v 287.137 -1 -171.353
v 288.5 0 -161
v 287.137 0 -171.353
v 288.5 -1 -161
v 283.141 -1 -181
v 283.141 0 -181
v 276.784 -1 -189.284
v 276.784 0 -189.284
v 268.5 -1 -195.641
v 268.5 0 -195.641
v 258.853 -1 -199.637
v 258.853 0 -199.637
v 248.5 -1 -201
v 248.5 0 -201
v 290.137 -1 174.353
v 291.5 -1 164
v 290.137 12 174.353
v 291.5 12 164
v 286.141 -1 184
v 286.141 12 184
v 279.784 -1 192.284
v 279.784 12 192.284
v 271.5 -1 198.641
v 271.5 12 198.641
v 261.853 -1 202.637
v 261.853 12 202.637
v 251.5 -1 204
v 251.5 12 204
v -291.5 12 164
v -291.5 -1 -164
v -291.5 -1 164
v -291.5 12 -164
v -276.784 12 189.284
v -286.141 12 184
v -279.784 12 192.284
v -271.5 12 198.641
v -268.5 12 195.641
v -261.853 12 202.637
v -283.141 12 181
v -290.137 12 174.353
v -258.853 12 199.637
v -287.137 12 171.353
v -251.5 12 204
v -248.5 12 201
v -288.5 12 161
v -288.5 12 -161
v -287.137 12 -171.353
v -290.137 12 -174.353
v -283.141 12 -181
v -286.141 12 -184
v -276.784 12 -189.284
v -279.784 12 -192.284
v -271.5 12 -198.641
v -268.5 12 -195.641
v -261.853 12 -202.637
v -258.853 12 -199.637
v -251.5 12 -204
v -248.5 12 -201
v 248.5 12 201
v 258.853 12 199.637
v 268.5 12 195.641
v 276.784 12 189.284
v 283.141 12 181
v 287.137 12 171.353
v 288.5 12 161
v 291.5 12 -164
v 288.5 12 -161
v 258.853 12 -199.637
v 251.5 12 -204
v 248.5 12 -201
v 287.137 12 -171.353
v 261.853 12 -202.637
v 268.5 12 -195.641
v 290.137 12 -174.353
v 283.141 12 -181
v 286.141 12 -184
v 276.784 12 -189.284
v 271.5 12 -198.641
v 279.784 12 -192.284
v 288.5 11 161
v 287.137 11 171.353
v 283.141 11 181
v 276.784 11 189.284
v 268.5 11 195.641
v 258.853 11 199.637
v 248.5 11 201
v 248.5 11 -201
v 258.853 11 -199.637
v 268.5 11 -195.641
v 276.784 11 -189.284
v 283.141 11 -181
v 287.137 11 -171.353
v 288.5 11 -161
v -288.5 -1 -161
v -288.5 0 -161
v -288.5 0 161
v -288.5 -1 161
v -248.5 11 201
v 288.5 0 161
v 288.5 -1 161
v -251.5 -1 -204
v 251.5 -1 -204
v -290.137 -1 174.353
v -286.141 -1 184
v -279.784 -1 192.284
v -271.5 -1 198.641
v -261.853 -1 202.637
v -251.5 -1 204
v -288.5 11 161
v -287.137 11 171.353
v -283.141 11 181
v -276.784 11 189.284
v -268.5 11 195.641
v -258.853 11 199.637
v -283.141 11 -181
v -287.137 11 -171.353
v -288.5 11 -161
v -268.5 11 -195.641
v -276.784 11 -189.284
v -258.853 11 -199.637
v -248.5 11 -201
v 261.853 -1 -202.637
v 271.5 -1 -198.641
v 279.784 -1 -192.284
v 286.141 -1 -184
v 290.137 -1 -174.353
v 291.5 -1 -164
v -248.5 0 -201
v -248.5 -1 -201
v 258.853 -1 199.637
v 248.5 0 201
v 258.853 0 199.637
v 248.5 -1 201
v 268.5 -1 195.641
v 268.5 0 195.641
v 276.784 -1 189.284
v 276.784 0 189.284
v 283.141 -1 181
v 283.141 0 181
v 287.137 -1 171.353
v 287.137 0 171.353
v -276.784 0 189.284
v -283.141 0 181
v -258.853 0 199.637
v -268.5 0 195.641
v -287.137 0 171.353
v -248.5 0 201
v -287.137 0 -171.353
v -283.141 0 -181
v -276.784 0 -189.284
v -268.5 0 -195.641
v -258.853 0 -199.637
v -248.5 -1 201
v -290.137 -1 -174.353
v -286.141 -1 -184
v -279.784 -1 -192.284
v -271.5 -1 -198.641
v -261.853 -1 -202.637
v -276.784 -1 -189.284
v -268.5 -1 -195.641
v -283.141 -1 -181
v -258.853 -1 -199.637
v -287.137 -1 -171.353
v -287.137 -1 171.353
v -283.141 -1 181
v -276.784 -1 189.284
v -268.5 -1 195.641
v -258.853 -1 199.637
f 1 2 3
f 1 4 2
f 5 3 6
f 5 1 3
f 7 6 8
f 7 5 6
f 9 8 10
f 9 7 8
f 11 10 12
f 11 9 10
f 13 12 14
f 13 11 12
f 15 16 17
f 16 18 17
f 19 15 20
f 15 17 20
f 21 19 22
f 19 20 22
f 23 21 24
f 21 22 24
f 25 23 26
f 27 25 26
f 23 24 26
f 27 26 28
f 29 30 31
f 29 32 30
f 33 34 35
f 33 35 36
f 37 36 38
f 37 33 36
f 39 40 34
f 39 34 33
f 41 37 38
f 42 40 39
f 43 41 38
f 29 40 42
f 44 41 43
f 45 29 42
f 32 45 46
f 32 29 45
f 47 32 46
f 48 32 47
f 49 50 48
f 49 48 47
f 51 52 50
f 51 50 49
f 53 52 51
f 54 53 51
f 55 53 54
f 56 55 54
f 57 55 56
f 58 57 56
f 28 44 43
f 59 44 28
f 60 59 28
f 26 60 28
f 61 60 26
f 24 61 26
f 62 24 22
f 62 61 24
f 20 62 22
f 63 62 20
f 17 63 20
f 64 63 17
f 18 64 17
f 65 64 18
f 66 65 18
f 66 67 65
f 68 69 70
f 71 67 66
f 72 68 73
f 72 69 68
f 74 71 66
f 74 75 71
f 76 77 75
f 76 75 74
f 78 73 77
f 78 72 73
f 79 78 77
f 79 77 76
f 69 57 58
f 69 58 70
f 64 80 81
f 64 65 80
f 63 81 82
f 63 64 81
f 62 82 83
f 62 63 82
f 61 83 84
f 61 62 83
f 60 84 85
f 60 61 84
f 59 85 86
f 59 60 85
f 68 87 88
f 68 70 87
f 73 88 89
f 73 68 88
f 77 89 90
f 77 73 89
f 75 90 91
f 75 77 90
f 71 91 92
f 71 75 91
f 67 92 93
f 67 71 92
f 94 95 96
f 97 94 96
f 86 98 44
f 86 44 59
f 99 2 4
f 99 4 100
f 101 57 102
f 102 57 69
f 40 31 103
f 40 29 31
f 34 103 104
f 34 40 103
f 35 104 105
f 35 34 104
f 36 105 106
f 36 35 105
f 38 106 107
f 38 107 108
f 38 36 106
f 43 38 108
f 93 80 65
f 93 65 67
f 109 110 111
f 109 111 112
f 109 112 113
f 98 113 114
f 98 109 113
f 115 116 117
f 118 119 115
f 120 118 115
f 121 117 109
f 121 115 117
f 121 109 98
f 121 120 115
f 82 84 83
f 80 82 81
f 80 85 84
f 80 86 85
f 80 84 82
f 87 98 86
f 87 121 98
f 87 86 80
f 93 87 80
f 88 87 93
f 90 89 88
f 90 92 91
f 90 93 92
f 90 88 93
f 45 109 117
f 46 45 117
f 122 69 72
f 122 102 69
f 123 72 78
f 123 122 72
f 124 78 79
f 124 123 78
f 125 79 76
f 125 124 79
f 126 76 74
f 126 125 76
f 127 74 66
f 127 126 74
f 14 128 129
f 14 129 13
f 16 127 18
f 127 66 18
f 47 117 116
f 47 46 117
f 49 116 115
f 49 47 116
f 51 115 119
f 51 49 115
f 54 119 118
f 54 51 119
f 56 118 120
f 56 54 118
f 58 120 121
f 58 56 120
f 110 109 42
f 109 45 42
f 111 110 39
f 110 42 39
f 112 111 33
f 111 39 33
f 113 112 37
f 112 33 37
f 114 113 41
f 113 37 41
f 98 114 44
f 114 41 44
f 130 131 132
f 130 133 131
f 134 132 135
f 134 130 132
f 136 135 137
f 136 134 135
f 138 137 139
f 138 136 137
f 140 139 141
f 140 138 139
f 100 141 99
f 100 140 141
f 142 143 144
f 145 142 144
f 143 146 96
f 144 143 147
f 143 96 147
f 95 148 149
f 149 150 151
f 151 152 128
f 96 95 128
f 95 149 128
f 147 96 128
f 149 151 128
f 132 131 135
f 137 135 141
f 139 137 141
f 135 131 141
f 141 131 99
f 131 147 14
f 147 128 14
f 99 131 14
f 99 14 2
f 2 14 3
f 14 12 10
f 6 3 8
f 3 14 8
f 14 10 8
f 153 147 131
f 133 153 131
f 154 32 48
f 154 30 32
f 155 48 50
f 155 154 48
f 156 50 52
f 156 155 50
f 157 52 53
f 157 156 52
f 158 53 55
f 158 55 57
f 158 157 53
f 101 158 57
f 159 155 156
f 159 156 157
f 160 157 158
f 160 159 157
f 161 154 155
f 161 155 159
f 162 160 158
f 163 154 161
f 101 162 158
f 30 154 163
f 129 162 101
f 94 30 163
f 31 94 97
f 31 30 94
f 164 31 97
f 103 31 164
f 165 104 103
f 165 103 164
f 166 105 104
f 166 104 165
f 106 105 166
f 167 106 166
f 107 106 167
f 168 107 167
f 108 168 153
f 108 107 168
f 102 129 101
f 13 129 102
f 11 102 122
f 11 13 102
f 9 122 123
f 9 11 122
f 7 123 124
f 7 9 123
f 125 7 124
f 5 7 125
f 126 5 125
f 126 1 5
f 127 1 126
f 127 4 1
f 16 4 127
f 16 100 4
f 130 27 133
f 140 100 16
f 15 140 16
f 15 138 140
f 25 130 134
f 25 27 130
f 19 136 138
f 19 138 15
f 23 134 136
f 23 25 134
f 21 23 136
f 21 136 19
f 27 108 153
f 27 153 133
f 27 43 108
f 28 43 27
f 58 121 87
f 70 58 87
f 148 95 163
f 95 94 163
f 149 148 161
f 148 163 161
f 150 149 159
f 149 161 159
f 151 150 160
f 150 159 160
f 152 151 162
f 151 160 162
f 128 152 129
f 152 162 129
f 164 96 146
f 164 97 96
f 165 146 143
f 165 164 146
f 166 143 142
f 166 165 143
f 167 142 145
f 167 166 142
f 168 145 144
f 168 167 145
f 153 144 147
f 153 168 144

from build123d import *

# Parameters (mm, degrees)
SKETCH1_W           = 583
SKETCH1_H           = 408
BOSS_EXTRUDE1_DEPTH = 11
SKETCH2_W           = 583
SKETCH2_H           = 408
SKETCH2_W_2         = 577
SKETCH2_H_2         = 402
BOSS_EXTRUDE2_DEPTH = 1
SKETCH3_W           = 583
SKETCH3_H           = 408
SKETCH3_W_2         = 577
SKETCH3_H_2         = 402
BOSS_EXTRUDE3_DEPTH = 1
FILLET2_R           = 40


with BuildPart() as part:
    # Sketch1 → Boss-Extrude1 (new body)
    with BuildSketch(Plane(origin=(0, 0, 0), x_dir=(1, 0, 0), z_dir=(0, 1, 0))):
        Rectangle(SKETCH1_W, SKETCH1_H)
    extrude(amount=BOSS_EXTRUDE1_DEPTH)

    # Sketch2 → Boss-Extrude2 (add)
    with BuildSketch(Plane(origin=(0, 11, 0), x_dir=(1, 0, 0), z_dir=(0, 1, 0))):
        Rectangle(SKETCH2_W, SKETCH2_H)
        Rectangle(SKETCH2_W_2, SKETCH2_H_2, mode=Mode.SUBTRACT)
    extrude(amount=BOSS_EXTRUDE2_DEPTH)

    # Sketch3 → Boss-Extrude3 (add)
    with BuildSketch(Plane.XZ):
        Rectangle(SKETCH3_W, SKETCH3_H)
        Rectangle(SKETCH3_W_2, SKETCH3_H_2, mode=Mode.SUBTRACT)
    extrude(amount=BOSS_EXTRUDE3_DEPTH)

    # Fillet2
    fillet2_edges = [part.edges().sort_by_distance(p)[0] for p in [
        (-288.5, 11.5, 201),
        (288.5, 11.5, 201),
        (288.5, 11.5, -201),
        (-288.5, 11.5, -201),
        (-288.5, -0.5, -201),
        (288.5, -0.5, -201),
        (288.5, -0.5, 201),
        (-288.5, -0.5, 201),
        (291.5, 5.5, 204),
        (-291.5, 5.5, 204),
        (-291.5, 5.5, -204),
        (291.5, 5.5, -204),
    ]]
    fillet(fillet2_edges, radius=FILLET2_R)


solid = part.part
